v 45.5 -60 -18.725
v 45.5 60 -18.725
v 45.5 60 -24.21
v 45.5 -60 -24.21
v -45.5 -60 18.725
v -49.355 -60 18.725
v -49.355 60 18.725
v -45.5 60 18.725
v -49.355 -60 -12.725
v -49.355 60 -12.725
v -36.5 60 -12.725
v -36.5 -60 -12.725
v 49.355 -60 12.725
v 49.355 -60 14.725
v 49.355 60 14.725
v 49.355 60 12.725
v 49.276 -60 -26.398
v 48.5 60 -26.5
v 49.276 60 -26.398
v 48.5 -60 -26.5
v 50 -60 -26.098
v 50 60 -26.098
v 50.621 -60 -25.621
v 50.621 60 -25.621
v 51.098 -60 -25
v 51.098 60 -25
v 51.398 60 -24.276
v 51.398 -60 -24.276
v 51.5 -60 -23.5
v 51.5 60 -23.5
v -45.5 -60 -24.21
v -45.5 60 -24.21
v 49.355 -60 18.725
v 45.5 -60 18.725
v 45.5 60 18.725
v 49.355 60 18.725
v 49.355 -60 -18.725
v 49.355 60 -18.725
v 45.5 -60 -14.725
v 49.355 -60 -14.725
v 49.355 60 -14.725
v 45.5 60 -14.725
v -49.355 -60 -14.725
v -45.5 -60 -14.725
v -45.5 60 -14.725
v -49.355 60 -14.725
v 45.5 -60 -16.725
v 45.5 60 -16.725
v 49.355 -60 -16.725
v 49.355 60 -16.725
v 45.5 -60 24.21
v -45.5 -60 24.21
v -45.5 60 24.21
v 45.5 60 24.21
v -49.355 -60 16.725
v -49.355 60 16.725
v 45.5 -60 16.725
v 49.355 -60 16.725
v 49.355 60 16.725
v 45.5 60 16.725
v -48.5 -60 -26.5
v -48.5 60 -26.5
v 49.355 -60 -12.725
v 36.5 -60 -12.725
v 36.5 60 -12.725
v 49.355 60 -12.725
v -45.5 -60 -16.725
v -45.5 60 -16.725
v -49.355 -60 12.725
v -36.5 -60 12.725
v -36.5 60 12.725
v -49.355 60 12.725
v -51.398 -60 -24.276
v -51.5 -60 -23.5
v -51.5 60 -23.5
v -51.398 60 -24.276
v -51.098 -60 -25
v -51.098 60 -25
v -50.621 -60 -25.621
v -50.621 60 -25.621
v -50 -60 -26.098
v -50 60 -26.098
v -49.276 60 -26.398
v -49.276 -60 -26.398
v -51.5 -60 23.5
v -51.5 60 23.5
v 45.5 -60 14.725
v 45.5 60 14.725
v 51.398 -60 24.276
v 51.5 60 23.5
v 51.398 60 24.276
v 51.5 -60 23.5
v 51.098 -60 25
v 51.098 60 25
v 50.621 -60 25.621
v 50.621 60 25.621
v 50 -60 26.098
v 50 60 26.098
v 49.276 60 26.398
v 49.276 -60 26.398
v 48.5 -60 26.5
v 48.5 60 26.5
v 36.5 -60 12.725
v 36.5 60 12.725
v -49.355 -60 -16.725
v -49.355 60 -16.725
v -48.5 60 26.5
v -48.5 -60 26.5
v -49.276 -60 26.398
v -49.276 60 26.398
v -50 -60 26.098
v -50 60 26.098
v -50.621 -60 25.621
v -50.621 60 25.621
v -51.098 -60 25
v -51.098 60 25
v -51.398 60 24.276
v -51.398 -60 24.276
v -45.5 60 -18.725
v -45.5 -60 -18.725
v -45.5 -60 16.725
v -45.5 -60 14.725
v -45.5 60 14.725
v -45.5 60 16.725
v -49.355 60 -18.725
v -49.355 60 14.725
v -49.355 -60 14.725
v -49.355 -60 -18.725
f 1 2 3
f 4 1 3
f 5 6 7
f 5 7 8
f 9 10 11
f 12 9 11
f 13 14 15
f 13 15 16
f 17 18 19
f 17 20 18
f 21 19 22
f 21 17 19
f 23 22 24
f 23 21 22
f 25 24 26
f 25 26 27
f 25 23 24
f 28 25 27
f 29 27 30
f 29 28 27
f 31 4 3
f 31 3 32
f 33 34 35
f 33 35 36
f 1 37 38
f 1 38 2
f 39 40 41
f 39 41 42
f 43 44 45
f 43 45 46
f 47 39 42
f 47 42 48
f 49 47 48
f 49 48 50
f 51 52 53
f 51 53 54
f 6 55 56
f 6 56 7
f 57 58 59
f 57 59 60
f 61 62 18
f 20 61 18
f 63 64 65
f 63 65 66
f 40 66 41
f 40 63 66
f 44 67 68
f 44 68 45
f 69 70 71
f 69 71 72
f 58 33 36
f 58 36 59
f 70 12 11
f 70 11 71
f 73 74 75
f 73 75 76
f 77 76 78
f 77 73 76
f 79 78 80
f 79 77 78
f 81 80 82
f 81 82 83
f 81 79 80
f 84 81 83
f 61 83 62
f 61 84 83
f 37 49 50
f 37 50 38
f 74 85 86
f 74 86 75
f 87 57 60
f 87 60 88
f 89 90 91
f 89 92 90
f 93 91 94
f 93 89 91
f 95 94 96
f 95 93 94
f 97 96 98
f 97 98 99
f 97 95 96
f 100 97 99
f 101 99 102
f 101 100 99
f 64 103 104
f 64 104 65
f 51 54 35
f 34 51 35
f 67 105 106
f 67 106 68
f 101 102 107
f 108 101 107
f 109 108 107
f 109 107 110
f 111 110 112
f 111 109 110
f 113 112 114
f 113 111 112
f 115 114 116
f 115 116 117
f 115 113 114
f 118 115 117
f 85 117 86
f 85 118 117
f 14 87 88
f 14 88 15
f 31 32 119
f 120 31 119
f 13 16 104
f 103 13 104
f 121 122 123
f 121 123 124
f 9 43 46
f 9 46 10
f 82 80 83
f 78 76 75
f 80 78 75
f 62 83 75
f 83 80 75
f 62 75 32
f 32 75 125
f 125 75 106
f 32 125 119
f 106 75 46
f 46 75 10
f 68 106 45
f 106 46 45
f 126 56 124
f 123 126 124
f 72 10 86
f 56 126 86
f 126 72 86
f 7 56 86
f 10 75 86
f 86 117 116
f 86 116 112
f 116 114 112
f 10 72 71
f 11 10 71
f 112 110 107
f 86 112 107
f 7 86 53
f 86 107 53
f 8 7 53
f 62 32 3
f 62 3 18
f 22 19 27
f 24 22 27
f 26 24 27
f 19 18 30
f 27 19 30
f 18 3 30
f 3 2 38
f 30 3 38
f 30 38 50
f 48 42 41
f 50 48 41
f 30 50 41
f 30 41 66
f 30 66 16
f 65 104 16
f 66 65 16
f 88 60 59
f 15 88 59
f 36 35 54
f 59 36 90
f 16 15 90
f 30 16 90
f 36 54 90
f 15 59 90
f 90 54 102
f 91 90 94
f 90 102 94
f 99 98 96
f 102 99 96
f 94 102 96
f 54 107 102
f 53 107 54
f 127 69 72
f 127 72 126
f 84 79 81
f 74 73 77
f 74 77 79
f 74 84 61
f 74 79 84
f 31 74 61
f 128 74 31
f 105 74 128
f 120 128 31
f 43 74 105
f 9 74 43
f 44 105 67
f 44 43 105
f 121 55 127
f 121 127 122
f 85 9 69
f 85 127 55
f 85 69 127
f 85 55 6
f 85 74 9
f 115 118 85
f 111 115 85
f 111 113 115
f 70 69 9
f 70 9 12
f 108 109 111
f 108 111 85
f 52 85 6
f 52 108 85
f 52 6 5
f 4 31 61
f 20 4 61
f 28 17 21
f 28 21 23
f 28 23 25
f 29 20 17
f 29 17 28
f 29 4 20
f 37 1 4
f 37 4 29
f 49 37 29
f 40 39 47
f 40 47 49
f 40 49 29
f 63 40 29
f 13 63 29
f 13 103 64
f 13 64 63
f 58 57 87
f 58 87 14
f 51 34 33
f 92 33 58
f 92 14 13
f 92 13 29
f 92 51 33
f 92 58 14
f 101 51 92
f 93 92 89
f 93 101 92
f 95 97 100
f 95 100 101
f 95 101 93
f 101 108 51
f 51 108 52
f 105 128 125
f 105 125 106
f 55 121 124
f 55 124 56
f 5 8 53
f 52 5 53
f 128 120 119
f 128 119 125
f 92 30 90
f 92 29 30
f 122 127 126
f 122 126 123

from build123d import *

# Parameters (mm, degrees)
F1_DEPTH = 60


with BuildPart() as f1:
    # F0 (on Front) → F1 (new body, symmetric)
    with BuildSketch(Plane.XZ):
        with BuildLine():
            Line((49.355, 12.725), (51.5, 12.725))
            Line((51.5, 12.725), (51.5, 23.5))
            ThreePointArc((51.5, 23.5), (50.62132, 25.62132), (48.5, 26.5))
            Line((48.5, 26.5), (-48.5, 26.5))
            ThreePointArc((-48.5, 26.5), (-50.62132, 25.62132), (-51.5, 23.5))
            Line((-51.5, 23.5), (-51.5, 12.725))
            Line((-51.5, 12.725), (-49.355, 12.725))
            Line((-49.355, 12.725), (-49.355, 14.725))
            Line((-49.355, 14.725), (-45.5, 14.725))
            Line((-45.5, 14.725), (-45.5, 16.725))
            Line((-45.5, 16.725), (-49.355, 16.725))
            Line((-49.355, 16.725), (-49.355, 18.725))
            Line((-49.355, 18.725), (-45.5, 18.725))
            Line((-45.5, 18.725), (-45.5, 24.21))
            Line((-45.5, 24.21), (45.5, 24.21))
            Line((45.5, 24.21), (45.5, 18.725))
            Line((45.5, 18.725), (49.355, 18.725))
            Line((49.355, 18.725), (49.355, 16.725))
            Line((49.355, 16.725), (45.5, 16.725))
            Line((45.5, 16.725), (45.5, 14.725))
            Line((45.5, 14.725), (49.355, 14.725))
            Line((49.355, 14.725), (49.355, 12.725))
        make_face()
        Polygon((-51.5, 12.725), (-51.5, -12.725), (-49.355, -12.725), (-36.5, -12.725), (-36.5, 12.725), (-49.355, 12.725), align=None)
        with BuildLine():
            Line((-48.5, -26.5), (48.5, -26.5))
            ThreePointArc((48.5, -26.5), (50.62132, -25.62132), (51.5, -23.5))
            Line((51.5, -23.5), (51.5, -12.725))
            Line((51.5, -12.725), (49.355, -12.725))
            Line((49.355, -12.725), (49.355, -14.725))
            Line((49.355, -14.725), (45.5, -14.725))
            Line((45.5, -14.725), (45.5, -16.725))
            Line((45.5, -16.725), (49.355, -16.725))
            Line((49.355, -16.725), (49.355, -18.725))
            Line((49.355, -18.725), (45.5, -18.725))
            Line((45.5, -18.725), (45.5, -24.21))
            Line((45.5, -24.21), (-45.5, -24.21))
            Line((-45.5, -24.21), (-45.5, -18.725))
            Line((-45.5, -18.725), (-49.355, -18.725))
            Line((-49.355, -18.725), (-49.355, -16.725))
            Line((-49.355, -16.725), (-45.5, -16.725))
            Line((-45.5, -16.725), (-45.5, -14.725))
            Line((-45.5, -14.725), (-49.355, -14.725))
            Line((-49.355, -14.725), (-49.355, -12.725))
            Line((-49.355, -12.725), (-51.5, -12.725))
            Line((-51.5, -12.725), (-51.5, -23.5))
            ThreePointArc((-51.5, -23.5), (-50.62132, -25.62132), (-48.5, -26.5))
        make_face()
        Polygon((49.355, -12.725), (51.5, -12.725), (51.5, 12.725), (49.355, 12.725), (36.5, 12.725), (36.5, -12.725), align=None)
    extrude(amount=F1_DEPTH, both=True)


solid = f1.part
